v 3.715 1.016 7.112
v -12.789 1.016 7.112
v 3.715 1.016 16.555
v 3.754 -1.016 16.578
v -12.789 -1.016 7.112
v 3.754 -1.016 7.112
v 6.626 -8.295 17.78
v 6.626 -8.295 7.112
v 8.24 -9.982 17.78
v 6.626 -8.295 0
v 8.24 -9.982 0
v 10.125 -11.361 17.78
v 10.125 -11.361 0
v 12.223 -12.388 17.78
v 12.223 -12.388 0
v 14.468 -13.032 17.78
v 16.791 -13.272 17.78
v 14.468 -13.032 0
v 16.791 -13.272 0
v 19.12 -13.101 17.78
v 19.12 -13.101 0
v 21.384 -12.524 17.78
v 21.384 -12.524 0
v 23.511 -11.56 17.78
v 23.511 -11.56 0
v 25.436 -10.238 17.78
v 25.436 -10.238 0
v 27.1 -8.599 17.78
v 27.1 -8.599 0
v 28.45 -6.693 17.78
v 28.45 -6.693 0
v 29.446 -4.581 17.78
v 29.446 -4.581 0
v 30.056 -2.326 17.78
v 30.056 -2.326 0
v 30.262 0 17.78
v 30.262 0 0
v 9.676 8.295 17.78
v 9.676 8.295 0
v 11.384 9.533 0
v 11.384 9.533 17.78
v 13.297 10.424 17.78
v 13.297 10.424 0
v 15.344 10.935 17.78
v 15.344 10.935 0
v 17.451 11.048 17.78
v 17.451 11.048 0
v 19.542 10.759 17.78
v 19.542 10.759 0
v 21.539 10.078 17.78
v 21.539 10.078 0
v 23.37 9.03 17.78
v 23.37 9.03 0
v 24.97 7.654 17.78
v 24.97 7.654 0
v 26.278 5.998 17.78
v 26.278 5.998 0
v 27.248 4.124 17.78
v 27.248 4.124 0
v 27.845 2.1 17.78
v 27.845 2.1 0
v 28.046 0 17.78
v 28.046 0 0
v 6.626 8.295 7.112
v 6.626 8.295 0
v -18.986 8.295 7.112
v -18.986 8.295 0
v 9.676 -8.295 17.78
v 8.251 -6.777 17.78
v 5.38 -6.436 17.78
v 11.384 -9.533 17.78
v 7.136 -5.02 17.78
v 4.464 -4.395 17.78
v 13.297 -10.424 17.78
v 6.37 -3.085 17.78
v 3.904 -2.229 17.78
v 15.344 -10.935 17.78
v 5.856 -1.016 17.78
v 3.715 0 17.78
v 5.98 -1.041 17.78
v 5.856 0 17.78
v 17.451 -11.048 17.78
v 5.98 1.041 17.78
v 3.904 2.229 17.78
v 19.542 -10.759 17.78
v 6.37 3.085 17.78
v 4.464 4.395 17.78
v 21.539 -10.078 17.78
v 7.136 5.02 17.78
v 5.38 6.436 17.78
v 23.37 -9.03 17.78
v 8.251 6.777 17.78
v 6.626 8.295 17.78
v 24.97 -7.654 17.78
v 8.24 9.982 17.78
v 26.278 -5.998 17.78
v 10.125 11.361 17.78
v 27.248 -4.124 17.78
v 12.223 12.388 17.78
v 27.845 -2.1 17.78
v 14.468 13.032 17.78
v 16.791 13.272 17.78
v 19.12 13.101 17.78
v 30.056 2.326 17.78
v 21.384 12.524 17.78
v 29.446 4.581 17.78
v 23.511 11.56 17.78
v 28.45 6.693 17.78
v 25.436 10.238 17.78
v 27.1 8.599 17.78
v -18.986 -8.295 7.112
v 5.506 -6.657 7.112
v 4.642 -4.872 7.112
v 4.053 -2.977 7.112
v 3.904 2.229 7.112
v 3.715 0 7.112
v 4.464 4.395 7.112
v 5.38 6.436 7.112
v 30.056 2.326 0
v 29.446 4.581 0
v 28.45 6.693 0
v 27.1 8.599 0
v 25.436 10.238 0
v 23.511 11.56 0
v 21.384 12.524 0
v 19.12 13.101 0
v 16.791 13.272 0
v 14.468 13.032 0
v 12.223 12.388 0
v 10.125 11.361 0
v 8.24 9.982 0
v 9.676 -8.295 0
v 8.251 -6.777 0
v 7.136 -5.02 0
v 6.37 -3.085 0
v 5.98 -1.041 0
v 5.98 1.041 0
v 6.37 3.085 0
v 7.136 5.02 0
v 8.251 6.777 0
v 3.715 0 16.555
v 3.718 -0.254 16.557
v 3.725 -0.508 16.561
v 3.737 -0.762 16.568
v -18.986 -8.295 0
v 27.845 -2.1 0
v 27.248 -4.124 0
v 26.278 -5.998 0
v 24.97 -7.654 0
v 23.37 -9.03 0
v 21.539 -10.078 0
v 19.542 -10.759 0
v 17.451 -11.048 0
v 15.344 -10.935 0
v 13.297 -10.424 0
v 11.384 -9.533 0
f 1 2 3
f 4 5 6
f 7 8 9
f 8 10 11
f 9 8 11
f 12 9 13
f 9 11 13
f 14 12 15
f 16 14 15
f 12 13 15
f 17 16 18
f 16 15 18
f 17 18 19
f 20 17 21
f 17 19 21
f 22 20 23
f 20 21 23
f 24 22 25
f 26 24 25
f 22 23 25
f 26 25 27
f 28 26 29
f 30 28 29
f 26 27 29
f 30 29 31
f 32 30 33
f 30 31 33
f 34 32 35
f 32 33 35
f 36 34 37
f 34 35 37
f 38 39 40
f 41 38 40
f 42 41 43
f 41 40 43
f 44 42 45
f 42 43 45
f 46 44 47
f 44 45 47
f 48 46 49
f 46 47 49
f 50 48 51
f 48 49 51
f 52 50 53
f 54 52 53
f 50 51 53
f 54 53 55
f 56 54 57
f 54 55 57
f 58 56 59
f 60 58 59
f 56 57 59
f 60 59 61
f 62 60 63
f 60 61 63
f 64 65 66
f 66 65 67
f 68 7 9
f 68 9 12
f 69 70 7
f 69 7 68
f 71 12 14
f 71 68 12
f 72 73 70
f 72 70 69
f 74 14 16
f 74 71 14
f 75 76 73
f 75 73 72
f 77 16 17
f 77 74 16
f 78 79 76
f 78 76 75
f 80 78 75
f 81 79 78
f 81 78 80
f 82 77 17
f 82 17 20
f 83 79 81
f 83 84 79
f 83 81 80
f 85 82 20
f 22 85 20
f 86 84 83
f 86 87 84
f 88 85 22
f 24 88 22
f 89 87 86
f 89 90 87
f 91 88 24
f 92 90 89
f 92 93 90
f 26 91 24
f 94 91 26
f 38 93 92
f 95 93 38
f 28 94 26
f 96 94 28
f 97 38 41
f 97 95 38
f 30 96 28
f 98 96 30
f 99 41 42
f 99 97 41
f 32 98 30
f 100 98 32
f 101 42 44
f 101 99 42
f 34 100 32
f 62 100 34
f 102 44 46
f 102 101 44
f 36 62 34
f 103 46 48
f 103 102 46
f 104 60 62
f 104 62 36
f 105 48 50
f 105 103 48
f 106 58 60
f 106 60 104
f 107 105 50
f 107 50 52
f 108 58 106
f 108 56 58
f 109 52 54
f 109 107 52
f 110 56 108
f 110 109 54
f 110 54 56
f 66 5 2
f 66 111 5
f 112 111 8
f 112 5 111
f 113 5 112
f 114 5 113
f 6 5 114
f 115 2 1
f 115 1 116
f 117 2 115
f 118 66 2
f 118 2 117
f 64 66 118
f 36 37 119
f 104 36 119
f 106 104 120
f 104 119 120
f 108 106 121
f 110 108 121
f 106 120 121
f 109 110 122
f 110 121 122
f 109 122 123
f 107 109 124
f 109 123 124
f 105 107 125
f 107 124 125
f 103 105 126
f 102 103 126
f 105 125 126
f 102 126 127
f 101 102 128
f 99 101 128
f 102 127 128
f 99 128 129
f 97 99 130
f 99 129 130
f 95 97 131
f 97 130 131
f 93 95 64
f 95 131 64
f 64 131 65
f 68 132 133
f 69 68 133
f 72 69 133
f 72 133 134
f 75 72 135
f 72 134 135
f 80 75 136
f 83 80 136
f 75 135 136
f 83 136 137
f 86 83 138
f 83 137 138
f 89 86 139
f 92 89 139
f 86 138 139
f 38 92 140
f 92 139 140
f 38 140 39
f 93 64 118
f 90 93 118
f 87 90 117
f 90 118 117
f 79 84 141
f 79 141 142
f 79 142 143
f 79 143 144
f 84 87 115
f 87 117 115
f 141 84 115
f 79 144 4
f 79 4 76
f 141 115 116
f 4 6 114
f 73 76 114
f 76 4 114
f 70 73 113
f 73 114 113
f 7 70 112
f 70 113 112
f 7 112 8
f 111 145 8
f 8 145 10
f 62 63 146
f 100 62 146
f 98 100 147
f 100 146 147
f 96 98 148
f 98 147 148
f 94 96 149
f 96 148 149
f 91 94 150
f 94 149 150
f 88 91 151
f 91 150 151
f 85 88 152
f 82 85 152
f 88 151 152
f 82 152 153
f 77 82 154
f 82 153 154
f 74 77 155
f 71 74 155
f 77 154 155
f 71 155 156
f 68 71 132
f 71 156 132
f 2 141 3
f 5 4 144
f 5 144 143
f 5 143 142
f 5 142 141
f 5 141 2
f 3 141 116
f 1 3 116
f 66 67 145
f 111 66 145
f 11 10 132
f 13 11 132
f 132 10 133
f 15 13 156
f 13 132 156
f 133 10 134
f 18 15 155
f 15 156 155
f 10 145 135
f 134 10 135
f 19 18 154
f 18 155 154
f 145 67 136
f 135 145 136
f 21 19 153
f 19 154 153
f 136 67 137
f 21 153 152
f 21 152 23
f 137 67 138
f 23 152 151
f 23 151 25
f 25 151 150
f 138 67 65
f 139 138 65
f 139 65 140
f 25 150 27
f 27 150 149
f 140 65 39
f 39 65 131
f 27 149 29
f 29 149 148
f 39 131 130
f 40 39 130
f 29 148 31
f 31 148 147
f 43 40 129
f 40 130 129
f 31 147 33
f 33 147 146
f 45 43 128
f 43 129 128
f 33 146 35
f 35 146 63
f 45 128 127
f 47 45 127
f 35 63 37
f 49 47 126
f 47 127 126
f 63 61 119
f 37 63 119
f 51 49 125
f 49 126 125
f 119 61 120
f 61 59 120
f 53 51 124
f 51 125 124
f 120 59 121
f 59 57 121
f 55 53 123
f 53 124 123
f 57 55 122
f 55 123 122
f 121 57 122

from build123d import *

# Parameters (mm, degrees)
F1_DEPTH = 7.112
F2_DEPTH = 17.78
F4_DEPTH = 1.016
F5_DEPTH = 1.016


with BuildPart() as f1:
    # F0 (on Top) → F1 (new body)
    with BuildSketch(Plane.XY):
        with BuildLine():
            ThreePointArc((6.6260949281, -8.2945636224), (3.7152332811, 0), (6.6260949281, 8.2945636224))
            Line((6.6260949281, 8.2945636224), (-18.9858246595, 8.2945636224))
            Line((-18.9858246595, 8.2945636224), (-18.9858246595, -8.2945636224))
            Line((-18.9858246595, -8.2945636224), (6.6260949281, -8.2945636224))
        make_face()
    extrude(amount=F1_DEPTH)

    # F0 (on Top) → F2 (join)
    with BuildSketch(Plane.XY):
        with BuildLine():
            Line((6.6260949281, 8.2945636224), (9.6757363367, 8.2945636224))
            ThreePointArc((9.6757363367, 8.2945636224), (21.5388654762, 10.0781398953), (28.046251553, 0))
            ThreePointArc((28.046251553, 0), (21.5388654762, -10.0781398953), (9.6757363367, -8.2945636224))
            Line((9.6757363367, -8.2945636224), (6.6260949281, -8.2945636224))
            ThreePointArc((6.6260949281, -8.2945636224), (21.3836842093, -12.5243614328), (30.2616345138, 0))
            ThreePointArc((30.2616345138, 0), (21.3836842093, 12.5243614328), (6.6260949281, 8.2945636224))
        make_face()
        with BuildLine():
            ThreePointArc((9.6757363367, -8.2945636224), (5.930616242, 0), (9.6757363367, 8.2945636224))
            Line((9.6757363367, 8.2945636224), (6.6260949281, 8.2945636224))
            ThreePointArc((6.6260949281, 8.2945636224), (3.7152332811, 0), (6.6260949281, -8.2945636224))
            Line((6.6260949281, -8.2945636224), (9.6757363367, -8.2945636224))
        make_face()
    extrude(amount=F2_DEPTH)

    # F3 (on Front) → F4 (join)
    with BuildSketch(Plane.XZ):
        Polygon((-12.7892365647, 7.112), (5.8557423763, 7.112), (5.8557423763, 17.78), align=None)
    extrude(amount=F4_DEPTH)

    # F5 (add): a face of the model
    f5_faces = [f1.faces().sort_by_distance(p)[0] for p in [
        (-1.7862566675, 0, 10.2597587053),
    ]]
    extrude(f5_faces, amount=F5_DEPTH)


solid = f1.part
